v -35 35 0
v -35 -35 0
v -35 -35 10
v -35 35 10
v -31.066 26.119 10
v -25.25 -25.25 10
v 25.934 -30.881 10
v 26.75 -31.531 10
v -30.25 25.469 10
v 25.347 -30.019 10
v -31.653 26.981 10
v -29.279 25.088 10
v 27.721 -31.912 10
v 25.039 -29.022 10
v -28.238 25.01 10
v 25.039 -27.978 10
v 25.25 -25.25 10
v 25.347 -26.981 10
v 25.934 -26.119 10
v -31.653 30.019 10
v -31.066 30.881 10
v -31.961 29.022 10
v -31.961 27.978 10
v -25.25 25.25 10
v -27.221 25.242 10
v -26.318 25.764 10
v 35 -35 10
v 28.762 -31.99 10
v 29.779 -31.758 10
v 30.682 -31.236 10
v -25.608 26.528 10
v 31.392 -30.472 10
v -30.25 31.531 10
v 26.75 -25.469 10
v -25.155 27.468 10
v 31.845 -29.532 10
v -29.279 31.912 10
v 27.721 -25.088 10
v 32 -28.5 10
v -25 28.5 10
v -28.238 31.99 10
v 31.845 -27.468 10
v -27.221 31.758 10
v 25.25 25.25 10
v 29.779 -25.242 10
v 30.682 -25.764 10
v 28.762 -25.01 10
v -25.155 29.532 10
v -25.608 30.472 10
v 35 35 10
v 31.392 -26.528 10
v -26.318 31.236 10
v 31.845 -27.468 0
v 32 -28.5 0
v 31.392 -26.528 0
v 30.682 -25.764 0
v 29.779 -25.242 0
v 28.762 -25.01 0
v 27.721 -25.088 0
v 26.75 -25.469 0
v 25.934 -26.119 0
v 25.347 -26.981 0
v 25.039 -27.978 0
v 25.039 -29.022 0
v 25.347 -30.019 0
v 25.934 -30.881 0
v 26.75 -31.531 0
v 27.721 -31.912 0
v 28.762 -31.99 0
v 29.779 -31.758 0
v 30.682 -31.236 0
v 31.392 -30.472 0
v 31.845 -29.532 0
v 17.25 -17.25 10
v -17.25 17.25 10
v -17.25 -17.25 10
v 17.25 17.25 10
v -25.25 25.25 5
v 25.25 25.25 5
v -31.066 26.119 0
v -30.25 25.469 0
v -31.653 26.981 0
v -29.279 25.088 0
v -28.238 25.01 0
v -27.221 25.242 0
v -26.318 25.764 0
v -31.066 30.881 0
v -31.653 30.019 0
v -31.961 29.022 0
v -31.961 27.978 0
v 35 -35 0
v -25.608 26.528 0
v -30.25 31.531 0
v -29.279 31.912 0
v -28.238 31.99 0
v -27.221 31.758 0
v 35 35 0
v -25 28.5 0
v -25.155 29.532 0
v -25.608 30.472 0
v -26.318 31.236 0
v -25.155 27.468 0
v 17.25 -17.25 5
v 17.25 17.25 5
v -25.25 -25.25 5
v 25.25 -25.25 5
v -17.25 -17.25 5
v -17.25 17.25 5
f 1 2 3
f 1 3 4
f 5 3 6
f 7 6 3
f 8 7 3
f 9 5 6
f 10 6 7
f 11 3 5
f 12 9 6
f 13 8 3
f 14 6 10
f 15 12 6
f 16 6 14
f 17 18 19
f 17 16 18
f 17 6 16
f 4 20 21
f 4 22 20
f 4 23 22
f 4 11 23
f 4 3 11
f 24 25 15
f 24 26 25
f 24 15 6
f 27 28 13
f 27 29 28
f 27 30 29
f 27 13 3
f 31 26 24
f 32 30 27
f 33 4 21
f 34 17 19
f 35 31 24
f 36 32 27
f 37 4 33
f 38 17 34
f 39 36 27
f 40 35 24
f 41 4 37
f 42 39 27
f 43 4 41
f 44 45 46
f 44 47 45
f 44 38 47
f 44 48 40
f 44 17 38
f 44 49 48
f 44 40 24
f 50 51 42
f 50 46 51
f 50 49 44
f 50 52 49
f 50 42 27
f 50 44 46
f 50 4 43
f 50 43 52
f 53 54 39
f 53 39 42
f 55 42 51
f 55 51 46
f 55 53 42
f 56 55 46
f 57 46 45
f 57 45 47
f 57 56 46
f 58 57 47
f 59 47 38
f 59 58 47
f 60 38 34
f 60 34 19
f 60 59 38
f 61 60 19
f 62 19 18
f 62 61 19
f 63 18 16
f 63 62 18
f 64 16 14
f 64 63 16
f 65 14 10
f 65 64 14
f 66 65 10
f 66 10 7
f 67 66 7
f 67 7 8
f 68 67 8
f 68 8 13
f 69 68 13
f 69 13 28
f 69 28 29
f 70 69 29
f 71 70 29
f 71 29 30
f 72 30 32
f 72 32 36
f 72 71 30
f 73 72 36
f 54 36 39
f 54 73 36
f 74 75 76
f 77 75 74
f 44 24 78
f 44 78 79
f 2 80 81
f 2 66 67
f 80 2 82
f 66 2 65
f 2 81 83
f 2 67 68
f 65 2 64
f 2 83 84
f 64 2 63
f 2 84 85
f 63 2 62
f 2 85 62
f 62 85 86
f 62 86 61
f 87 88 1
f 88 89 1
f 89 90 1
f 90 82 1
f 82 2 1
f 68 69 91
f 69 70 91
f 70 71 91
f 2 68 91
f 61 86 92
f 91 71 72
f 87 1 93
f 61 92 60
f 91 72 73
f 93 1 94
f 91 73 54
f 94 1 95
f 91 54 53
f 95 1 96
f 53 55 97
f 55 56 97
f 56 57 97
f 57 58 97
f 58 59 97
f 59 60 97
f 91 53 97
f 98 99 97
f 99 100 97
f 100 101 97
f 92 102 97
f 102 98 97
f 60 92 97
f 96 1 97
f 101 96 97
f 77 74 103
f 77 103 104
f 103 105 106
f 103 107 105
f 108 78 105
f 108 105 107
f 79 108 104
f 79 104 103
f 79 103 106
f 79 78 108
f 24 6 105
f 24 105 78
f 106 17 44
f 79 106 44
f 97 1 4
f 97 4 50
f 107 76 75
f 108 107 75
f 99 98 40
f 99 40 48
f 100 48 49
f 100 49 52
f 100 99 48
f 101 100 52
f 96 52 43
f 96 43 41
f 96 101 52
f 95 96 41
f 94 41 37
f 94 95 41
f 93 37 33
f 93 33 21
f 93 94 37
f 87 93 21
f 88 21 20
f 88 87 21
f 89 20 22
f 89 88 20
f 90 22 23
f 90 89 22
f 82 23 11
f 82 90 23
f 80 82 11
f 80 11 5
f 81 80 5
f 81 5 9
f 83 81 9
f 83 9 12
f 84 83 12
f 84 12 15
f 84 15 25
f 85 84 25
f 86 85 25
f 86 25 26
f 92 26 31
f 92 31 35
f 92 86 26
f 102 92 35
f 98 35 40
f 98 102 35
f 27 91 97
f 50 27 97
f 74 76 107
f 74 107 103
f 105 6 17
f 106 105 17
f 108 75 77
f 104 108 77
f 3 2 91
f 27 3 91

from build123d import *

# Parameters (mm, degrees)
F0_W     = 70
F0_H     = 70
F0_R     = 3.5
F1_DEPTH = 10
F2_W     = 50.5
F2_H     = 50.5
F2_W_2   = 34.5
F2_H_2   = 34.5
F3_DEPTH = 5


with BuildPart() as f1:
    # F0 (on Top) → F1 (new body)
    with BuildSketch(Plane.XY):
        Rectangle(F0_W, F0_H)
        with Locations((28.5, -28.5)):
            Circle(F0_R, mode=Mode.SUBTRACT)
        with Locations((-28.5, 28.5)):
            Circle(F0_R, mode=Mode.SUBTRACT)
    extrude(amount=F1_DEPTH)

    # F2 (on face) → F3 (cut)
    with BuildSketch(Plane.XY.offset(10)):
        Rectangle(F2_W, F2_H)
        Rectangle(F2_W_2, F2_H_2, mode=Mode.SUBTRACT)
    extrude(amount=-F3_DEPTH, mode=Mode.SUBTRACT)


solid = f1.part
